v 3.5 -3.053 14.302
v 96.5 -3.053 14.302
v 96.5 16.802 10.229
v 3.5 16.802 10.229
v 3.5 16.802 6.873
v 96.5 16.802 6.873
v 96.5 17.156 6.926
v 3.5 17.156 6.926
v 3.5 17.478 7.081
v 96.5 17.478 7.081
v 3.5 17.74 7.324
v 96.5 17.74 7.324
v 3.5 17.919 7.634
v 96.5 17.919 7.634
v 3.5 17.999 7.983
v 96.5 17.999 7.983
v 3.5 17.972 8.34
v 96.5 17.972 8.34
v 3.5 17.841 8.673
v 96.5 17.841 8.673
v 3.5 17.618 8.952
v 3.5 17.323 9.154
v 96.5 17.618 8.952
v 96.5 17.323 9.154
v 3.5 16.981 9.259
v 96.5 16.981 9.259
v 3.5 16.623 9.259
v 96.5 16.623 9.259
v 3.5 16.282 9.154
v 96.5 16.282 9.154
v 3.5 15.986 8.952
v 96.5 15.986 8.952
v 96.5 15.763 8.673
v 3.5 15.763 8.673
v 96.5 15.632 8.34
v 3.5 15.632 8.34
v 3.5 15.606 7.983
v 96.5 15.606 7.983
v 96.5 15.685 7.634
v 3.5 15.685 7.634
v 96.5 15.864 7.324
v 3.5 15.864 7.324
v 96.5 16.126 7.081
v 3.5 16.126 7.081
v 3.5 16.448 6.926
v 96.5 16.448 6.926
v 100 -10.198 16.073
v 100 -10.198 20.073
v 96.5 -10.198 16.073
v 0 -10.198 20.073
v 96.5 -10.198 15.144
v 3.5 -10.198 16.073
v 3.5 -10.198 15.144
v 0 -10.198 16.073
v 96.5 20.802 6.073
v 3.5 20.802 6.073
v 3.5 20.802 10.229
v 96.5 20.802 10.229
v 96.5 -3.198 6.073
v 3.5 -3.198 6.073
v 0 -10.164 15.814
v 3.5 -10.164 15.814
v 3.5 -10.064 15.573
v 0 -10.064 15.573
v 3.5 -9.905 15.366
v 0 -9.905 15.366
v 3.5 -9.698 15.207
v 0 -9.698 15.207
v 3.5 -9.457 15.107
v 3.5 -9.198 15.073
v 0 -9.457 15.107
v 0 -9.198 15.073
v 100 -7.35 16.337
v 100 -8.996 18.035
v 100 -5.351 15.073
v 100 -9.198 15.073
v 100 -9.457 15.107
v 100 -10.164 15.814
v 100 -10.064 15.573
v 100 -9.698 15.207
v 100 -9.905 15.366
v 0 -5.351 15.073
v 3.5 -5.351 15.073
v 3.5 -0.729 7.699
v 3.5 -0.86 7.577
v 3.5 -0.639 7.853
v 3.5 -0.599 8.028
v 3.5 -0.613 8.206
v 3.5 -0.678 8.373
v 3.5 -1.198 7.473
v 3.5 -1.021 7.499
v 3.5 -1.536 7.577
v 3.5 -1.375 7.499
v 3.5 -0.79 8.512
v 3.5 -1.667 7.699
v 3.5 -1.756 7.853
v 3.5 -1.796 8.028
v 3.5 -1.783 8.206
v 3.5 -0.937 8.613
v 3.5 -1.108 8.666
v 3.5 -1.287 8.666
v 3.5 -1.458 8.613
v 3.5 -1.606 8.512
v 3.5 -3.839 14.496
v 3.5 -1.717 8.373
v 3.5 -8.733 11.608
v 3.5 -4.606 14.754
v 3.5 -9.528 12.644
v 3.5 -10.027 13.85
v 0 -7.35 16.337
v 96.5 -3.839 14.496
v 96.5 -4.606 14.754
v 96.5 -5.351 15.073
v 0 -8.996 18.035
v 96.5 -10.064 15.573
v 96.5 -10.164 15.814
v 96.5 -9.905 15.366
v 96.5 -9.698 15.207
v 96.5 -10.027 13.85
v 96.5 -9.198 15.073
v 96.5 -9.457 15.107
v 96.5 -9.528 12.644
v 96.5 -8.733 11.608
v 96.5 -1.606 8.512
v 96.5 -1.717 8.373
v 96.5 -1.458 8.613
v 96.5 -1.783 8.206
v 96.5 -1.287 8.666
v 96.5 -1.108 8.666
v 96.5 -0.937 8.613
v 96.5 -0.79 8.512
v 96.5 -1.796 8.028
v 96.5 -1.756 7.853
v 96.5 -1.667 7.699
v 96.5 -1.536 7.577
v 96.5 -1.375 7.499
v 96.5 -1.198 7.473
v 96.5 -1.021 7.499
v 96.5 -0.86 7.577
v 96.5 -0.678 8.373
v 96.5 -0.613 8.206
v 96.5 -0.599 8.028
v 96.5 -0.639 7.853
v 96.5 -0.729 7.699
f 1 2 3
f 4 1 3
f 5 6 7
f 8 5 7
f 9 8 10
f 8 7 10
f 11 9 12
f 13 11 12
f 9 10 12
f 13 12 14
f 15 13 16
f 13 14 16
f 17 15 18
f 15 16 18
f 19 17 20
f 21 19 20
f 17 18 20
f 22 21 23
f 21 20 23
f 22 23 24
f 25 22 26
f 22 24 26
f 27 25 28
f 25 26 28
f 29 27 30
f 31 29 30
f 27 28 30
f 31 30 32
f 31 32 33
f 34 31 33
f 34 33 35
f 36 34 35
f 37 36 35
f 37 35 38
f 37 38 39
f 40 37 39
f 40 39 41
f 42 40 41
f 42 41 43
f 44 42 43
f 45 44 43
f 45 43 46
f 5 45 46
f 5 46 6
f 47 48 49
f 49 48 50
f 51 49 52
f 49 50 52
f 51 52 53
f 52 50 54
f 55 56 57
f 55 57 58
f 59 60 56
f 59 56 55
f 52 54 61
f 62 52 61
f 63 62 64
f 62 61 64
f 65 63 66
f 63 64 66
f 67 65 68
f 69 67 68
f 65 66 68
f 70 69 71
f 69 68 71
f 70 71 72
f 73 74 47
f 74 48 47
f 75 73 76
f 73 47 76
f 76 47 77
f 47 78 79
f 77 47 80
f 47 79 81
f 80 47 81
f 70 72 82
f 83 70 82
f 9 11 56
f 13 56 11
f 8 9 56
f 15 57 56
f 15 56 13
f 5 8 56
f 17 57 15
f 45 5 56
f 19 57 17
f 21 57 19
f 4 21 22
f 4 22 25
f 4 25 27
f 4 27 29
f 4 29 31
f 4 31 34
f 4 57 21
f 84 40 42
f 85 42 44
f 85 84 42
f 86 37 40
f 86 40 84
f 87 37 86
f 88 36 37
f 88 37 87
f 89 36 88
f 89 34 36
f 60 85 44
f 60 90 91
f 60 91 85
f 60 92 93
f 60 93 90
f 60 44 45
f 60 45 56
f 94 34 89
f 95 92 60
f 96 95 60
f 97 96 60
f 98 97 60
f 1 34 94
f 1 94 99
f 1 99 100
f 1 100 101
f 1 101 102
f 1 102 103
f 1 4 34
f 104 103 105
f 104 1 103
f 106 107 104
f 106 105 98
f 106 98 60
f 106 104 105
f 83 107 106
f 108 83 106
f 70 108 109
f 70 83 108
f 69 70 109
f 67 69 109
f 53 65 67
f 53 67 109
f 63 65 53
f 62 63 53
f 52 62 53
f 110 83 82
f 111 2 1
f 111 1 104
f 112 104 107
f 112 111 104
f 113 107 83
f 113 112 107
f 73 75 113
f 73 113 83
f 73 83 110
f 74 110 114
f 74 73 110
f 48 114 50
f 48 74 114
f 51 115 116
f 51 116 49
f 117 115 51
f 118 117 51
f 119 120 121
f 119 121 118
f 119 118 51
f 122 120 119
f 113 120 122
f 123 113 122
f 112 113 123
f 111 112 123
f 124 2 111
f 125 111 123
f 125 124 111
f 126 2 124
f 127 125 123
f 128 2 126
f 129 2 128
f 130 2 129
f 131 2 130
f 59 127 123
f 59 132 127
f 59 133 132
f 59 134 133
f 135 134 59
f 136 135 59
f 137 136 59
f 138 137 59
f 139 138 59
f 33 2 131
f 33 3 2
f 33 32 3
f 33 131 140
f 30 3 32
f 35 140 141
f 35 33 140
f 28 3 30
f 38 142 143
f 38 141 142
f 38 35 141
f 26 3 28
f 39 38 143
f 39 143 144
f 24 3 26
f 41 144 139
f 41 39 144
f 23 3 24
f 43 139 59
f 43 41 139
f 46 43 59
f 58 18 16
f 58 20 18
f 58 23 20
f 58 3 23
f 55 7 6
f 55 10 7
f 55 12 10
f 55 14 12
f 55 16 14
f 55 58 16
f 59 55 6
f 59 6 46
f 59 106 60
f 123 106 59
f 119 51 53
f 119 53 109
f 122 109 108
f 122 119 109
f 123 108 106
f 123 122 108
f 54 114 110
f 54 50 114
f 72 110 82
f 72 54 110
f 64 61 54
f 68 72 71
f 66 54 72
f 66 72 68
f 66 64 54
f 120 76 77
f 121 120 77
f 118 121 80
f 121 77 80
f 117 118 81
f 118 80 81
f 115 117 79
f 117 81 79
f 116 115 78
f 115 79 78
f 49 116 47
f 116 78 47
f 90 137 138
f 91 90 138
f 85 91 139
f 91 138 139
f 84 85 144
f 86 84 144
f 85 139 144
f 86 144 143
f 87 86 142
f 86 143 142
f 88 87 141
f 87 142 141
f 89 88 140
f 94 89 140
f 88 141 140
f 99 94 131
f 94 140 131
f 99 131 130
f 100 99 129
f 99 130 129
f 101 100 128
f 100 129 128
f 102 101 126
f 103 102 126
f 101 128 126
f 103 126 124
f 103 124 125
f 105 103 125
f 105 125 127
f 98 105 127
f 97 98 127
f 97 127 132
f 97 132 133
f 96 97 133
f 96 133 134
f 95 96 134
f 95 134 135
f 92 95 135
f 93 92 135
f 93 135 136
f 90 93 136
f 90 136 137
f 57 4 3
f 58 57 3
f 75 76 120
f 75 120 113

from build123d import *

# Parameters (mm, degrees)
SKETCH1_W           = 14
SKETCH1_H           = 27
BOSS_EXTRUDE1_DEPTH = 100
CUT_EXTRUDE1_DEPTH  = 100
FILLET1_R           = 10
SKETCH4_W           = 98.852101938
SKETCH4_H           = 4.155908349
BOSS_EXTRUDE2_DEPTH = 4
SKETCH5_R           = 1.2
SKETCH5_R_2         = 0.6
CUT_EXTRUDE2_DEPTH  = 100
CHAMFER1_SIZE       = 7
SKETCH6_W           = 4.155908349
SKETCH6_H           = 24
CUT_EXTRUDE3_DEPTH  = 3.5
SKETCH8_W           = 1.147898062
SKETCH8_H           = 4.155908349
BOSS_EXTRUDE3_DEPTH = 4
SKETCH9_W           = 4.155908349
SKETCH9_H           = 24
CUT_EXTRUDE4_DEPTH  = 3.5
SKETCH10_W          = 10.233519384
SKETCH10_H          = 31.339386183
CUT_EXTRUDE5_DEPTH  = 3.5
SKETCH11_W          = 18.924548437
SKETCH11_H          = 36.127134787
CUT_EXTRUDE7_DEPTH  = 3.5
FILLET2_R           = 5
FILLET5_R           = 1
FILLET6_R           = 1


with BuildPart() as part:
    # Sketch1 → Boss-Extrude1 (new body)
    with BuildSketch(Plane(origin=(0, 0, 0), x_dir=(0, 0, -1), z_dir=(1, 0, 0))):
        with Locations((-13.07263952, 3.302202671)):
            Rectangle(SKETCH1_W, SKETCH1_H)
    extrude(amount=BOSS_EXTRUDE1_DEPTH)

    # Sketch2 → Cut-Extrude1 (cut)
    with BuildSketch(Plane(origin=(100, 0, 0), x_dir=(0, 0, -1), z_dir=(1, 0, 0))):
        Polygon((-20.07263952, -10.197797329), (-15.511656896, -8.952001224), (-10.228547869, 16.802202671), (-20.07263952, 16.802202671), align=None)
    extrude(amount=-CUT_EXTRUDE1_DEPTH, mode=Mode.SUBTRACT)

    # Fillet1
    # the kernel refuses this fillet: 10 mm, written as the material it adds along each edge
    with BuildSketch(Plane(origin=(100, -8.952001224, 15.511656896), x_dir=(0, 0.9796012375346099, -0.20095127623546138), z_dir=(-1, 0, 0))) as fillet1_piece_1_section:
        with BuildLine():
            CenterArc((6.021748433, -10), FILLET1_R, 90, 54.673150745)
            Line((-2.136918685, -4.217599905), (-2.300092028, -4.101951904))
            ThreePointArc((-2.300092028, -4.101951904), (-1.246866474, -2.018406947), (-0.178407131, 0.090393006))
            Line((-0.178407131, 0.090393006), (0, 0.2))
            Line((0, 0.2), (6.021748433, 0.2))
            Line((6.021748433, 0.2), (6.021748433, 0))
        make_face()
    fillet1_piece_1 = extrude(amount=100, mode=Mode.PRIVATE)
    fillet1_piece_1 = split(fillet1_piece_1, bisect_by=Plane(origin=(50, -10.197797329, 16.270514602), z_dir=(0, 1, 0)), keep=Keep.TOP, mode=Mode.PRIVATE)
    add(fillet1_piece_1)

    # Sketch4 → Boss-Extrude2 (add)
    with BuildSketch(Plane(origin=(0, 16.802202671, 0), x_dir=(1, 0, 0), z_dir=(0, 1, 0))):
        with Locations((50.573949031, -8.150593694)):
            Rectangle(SKETCH4_W, SKETCH4_H)
    extrude(amount=BOSS_EXTRUDE2_DEPTH)

    # Sketch5 → Cut-Extrude2 (cut)
    with BuildSketch(Plane(origin=(100, 0, 0), x_dir=(0, 0, -1), z_dir=(1, 0, 0))):
        with Locations((-8.07263952, 16.802202671)):
            Circle(SKETCH5_R)
        with Locations((-8.07263952, -1.197797329)):
            Circle(SKETCH5_R_2)
    extrude(amount=-CUT_EXTRUDE2_DEPTH, mode=Mode.SUBTRACT)

    # Chamfer1
    chamfer1_edges = [part.edges().sort_by_distance(p)[0] for p in [
        (50, -10.197797329, 6.07263952),
    ]]
    chamfer(chamfer1_edges, length=CHAMFER1_SIZE)

    # Sketch6 → Cut-Extrude3 (cut)
    with BuildSketch(Plane(origin=(100, 0, 0), x_dir=(0, 0, -1), z_dir=(1, 0, 0))):
        with Locations((-8.150593694, 8.802202671)):
            Rectangle(SKETCH6_W, SKETCH6_H)
    extrude(amount=-CUT_EXTRUDE3_DEPTH, mode=Mode.SUBTRACT)

    # Sketch8 → Boss-Extrude3 (add)
    with BuildSketch(Plane(origin=(0, 16.802202671, 0), x_dir=(1, 0, 0), z_dir=(0, 1, 0))):
        with Locations((0.573949031, -8.150593694)):
            Rectangle(SKETCH8_W, SKETCH8_H)
    extrude(amount=BOSS_EXTRUDE3_DEPTH)

    # Sketch9 → Cut-Extrude4 (cut)
    with BuildSketch(Plane.ZY):
        with Locations((8.150593694, 8.802202671)):
            Rectangle(SKETCH9_W, SKETCH9_H)
    extrude(amount=-CUT_EXTRUDE4_DEPTH, mode=Mode.SUBTRACT)

    # Sketch10 → Cut-Extrude5 (cut)
    with BuildSketch(Plane.ZY):
        with Locations((9.955879828, 5.471895763)):
            Rectangle(SKETCH10_W, SKETCH10_H)
    extrude(amount=-CUT_EXTRUDE5_DEPTH, mode=Mode.SUBTRACT)

    # Sketch11 → Cut-Extrude7 (cut)
    with BuildSketch(Plane(origin=(100, 0, 0), x_dir=(0, 0, -1), z_dir=(1, 0, 0))):
        with Locations((-5.610365301, 7.865770065)):
            Rectangle(SKETCH11_W, SKETCH11_H)
    extrude(amount=-CUT_EXTRUDE7_DEPTH, mode=Mode.SUBTRACT)

    # Fillet2
    fillet2_edges = [part.edges().sort_by_distance(p)[0] for p in [
        (50, -10.197797329, 13.07263952),
    ]]
    fillet(fillet2_edges, radius=FILLET2_R)

    # Fillet5
    # the kernel refuses this fillet: 1 mm, written as the material it takes off along each edge
    with BuildSketch(Plane(origin=(102.500000319, -10.19729224, 15.07263952), x_dir=(0, -0.0005050888353824425, 0.9999998724426261), z_dir=(-1, 0, 0))) as fillet5_piece_1:
        with BuildLine():
            CenterArc((0.999495039, 0.999999872), FILLET5_R, 180.02893946, 90)
            Line((-0.000504834, 0.999494784), (-0.100504821, 0.999444275))
            Line((-0.100504821, 0.999444275), (-0.099999987, -5.0509e-05))
            Line((-0.099999987, -5.0509e-05), (-0.001370852, -0.099990603))
            ThreePointArc((-0.001370852, -0.099990603), (0.071118567, -0.100469181), (1.000050636, -0.099999987))
            Line((1.000050636, -0.099999987), (1.000000128, 0))
        make_face()
    extrude(amount=6.000000319, mode=Mode.SUBTRACT)

    # Fillet6
    # the kernel refuses this fillet: 1 mm, written as the material it takes off along each edge
    with BuildSketch(Plane(origin=(-2.500000319, -10.19729224, 15.07263952), x_dir=(0, 1, 0), z_dir=(1, 0, 0))) as fillet6_piece_1:
        with BuildLine():
            CenterArc((0.999494911, 1), FILLET6_R, 180, 90)
            Line((-0.000505089, 1), (-0.100505089, 1))
            ThreePointArc((-0.100505089, 1), (-0.100505089, 0.071067812), (-0.099989898, -0.001421356))
            Line((-0.099989898, -0.001421356), (0, -0.1))
            Line((0, -0.1), (0.999494911, -0.1))
            Line((0.999494911, -0.1), (0.999494911, 0))
        make_face()
    extrude(amount=6.000000319, mode=Mode.SUBTRACT)


solid = part.part
